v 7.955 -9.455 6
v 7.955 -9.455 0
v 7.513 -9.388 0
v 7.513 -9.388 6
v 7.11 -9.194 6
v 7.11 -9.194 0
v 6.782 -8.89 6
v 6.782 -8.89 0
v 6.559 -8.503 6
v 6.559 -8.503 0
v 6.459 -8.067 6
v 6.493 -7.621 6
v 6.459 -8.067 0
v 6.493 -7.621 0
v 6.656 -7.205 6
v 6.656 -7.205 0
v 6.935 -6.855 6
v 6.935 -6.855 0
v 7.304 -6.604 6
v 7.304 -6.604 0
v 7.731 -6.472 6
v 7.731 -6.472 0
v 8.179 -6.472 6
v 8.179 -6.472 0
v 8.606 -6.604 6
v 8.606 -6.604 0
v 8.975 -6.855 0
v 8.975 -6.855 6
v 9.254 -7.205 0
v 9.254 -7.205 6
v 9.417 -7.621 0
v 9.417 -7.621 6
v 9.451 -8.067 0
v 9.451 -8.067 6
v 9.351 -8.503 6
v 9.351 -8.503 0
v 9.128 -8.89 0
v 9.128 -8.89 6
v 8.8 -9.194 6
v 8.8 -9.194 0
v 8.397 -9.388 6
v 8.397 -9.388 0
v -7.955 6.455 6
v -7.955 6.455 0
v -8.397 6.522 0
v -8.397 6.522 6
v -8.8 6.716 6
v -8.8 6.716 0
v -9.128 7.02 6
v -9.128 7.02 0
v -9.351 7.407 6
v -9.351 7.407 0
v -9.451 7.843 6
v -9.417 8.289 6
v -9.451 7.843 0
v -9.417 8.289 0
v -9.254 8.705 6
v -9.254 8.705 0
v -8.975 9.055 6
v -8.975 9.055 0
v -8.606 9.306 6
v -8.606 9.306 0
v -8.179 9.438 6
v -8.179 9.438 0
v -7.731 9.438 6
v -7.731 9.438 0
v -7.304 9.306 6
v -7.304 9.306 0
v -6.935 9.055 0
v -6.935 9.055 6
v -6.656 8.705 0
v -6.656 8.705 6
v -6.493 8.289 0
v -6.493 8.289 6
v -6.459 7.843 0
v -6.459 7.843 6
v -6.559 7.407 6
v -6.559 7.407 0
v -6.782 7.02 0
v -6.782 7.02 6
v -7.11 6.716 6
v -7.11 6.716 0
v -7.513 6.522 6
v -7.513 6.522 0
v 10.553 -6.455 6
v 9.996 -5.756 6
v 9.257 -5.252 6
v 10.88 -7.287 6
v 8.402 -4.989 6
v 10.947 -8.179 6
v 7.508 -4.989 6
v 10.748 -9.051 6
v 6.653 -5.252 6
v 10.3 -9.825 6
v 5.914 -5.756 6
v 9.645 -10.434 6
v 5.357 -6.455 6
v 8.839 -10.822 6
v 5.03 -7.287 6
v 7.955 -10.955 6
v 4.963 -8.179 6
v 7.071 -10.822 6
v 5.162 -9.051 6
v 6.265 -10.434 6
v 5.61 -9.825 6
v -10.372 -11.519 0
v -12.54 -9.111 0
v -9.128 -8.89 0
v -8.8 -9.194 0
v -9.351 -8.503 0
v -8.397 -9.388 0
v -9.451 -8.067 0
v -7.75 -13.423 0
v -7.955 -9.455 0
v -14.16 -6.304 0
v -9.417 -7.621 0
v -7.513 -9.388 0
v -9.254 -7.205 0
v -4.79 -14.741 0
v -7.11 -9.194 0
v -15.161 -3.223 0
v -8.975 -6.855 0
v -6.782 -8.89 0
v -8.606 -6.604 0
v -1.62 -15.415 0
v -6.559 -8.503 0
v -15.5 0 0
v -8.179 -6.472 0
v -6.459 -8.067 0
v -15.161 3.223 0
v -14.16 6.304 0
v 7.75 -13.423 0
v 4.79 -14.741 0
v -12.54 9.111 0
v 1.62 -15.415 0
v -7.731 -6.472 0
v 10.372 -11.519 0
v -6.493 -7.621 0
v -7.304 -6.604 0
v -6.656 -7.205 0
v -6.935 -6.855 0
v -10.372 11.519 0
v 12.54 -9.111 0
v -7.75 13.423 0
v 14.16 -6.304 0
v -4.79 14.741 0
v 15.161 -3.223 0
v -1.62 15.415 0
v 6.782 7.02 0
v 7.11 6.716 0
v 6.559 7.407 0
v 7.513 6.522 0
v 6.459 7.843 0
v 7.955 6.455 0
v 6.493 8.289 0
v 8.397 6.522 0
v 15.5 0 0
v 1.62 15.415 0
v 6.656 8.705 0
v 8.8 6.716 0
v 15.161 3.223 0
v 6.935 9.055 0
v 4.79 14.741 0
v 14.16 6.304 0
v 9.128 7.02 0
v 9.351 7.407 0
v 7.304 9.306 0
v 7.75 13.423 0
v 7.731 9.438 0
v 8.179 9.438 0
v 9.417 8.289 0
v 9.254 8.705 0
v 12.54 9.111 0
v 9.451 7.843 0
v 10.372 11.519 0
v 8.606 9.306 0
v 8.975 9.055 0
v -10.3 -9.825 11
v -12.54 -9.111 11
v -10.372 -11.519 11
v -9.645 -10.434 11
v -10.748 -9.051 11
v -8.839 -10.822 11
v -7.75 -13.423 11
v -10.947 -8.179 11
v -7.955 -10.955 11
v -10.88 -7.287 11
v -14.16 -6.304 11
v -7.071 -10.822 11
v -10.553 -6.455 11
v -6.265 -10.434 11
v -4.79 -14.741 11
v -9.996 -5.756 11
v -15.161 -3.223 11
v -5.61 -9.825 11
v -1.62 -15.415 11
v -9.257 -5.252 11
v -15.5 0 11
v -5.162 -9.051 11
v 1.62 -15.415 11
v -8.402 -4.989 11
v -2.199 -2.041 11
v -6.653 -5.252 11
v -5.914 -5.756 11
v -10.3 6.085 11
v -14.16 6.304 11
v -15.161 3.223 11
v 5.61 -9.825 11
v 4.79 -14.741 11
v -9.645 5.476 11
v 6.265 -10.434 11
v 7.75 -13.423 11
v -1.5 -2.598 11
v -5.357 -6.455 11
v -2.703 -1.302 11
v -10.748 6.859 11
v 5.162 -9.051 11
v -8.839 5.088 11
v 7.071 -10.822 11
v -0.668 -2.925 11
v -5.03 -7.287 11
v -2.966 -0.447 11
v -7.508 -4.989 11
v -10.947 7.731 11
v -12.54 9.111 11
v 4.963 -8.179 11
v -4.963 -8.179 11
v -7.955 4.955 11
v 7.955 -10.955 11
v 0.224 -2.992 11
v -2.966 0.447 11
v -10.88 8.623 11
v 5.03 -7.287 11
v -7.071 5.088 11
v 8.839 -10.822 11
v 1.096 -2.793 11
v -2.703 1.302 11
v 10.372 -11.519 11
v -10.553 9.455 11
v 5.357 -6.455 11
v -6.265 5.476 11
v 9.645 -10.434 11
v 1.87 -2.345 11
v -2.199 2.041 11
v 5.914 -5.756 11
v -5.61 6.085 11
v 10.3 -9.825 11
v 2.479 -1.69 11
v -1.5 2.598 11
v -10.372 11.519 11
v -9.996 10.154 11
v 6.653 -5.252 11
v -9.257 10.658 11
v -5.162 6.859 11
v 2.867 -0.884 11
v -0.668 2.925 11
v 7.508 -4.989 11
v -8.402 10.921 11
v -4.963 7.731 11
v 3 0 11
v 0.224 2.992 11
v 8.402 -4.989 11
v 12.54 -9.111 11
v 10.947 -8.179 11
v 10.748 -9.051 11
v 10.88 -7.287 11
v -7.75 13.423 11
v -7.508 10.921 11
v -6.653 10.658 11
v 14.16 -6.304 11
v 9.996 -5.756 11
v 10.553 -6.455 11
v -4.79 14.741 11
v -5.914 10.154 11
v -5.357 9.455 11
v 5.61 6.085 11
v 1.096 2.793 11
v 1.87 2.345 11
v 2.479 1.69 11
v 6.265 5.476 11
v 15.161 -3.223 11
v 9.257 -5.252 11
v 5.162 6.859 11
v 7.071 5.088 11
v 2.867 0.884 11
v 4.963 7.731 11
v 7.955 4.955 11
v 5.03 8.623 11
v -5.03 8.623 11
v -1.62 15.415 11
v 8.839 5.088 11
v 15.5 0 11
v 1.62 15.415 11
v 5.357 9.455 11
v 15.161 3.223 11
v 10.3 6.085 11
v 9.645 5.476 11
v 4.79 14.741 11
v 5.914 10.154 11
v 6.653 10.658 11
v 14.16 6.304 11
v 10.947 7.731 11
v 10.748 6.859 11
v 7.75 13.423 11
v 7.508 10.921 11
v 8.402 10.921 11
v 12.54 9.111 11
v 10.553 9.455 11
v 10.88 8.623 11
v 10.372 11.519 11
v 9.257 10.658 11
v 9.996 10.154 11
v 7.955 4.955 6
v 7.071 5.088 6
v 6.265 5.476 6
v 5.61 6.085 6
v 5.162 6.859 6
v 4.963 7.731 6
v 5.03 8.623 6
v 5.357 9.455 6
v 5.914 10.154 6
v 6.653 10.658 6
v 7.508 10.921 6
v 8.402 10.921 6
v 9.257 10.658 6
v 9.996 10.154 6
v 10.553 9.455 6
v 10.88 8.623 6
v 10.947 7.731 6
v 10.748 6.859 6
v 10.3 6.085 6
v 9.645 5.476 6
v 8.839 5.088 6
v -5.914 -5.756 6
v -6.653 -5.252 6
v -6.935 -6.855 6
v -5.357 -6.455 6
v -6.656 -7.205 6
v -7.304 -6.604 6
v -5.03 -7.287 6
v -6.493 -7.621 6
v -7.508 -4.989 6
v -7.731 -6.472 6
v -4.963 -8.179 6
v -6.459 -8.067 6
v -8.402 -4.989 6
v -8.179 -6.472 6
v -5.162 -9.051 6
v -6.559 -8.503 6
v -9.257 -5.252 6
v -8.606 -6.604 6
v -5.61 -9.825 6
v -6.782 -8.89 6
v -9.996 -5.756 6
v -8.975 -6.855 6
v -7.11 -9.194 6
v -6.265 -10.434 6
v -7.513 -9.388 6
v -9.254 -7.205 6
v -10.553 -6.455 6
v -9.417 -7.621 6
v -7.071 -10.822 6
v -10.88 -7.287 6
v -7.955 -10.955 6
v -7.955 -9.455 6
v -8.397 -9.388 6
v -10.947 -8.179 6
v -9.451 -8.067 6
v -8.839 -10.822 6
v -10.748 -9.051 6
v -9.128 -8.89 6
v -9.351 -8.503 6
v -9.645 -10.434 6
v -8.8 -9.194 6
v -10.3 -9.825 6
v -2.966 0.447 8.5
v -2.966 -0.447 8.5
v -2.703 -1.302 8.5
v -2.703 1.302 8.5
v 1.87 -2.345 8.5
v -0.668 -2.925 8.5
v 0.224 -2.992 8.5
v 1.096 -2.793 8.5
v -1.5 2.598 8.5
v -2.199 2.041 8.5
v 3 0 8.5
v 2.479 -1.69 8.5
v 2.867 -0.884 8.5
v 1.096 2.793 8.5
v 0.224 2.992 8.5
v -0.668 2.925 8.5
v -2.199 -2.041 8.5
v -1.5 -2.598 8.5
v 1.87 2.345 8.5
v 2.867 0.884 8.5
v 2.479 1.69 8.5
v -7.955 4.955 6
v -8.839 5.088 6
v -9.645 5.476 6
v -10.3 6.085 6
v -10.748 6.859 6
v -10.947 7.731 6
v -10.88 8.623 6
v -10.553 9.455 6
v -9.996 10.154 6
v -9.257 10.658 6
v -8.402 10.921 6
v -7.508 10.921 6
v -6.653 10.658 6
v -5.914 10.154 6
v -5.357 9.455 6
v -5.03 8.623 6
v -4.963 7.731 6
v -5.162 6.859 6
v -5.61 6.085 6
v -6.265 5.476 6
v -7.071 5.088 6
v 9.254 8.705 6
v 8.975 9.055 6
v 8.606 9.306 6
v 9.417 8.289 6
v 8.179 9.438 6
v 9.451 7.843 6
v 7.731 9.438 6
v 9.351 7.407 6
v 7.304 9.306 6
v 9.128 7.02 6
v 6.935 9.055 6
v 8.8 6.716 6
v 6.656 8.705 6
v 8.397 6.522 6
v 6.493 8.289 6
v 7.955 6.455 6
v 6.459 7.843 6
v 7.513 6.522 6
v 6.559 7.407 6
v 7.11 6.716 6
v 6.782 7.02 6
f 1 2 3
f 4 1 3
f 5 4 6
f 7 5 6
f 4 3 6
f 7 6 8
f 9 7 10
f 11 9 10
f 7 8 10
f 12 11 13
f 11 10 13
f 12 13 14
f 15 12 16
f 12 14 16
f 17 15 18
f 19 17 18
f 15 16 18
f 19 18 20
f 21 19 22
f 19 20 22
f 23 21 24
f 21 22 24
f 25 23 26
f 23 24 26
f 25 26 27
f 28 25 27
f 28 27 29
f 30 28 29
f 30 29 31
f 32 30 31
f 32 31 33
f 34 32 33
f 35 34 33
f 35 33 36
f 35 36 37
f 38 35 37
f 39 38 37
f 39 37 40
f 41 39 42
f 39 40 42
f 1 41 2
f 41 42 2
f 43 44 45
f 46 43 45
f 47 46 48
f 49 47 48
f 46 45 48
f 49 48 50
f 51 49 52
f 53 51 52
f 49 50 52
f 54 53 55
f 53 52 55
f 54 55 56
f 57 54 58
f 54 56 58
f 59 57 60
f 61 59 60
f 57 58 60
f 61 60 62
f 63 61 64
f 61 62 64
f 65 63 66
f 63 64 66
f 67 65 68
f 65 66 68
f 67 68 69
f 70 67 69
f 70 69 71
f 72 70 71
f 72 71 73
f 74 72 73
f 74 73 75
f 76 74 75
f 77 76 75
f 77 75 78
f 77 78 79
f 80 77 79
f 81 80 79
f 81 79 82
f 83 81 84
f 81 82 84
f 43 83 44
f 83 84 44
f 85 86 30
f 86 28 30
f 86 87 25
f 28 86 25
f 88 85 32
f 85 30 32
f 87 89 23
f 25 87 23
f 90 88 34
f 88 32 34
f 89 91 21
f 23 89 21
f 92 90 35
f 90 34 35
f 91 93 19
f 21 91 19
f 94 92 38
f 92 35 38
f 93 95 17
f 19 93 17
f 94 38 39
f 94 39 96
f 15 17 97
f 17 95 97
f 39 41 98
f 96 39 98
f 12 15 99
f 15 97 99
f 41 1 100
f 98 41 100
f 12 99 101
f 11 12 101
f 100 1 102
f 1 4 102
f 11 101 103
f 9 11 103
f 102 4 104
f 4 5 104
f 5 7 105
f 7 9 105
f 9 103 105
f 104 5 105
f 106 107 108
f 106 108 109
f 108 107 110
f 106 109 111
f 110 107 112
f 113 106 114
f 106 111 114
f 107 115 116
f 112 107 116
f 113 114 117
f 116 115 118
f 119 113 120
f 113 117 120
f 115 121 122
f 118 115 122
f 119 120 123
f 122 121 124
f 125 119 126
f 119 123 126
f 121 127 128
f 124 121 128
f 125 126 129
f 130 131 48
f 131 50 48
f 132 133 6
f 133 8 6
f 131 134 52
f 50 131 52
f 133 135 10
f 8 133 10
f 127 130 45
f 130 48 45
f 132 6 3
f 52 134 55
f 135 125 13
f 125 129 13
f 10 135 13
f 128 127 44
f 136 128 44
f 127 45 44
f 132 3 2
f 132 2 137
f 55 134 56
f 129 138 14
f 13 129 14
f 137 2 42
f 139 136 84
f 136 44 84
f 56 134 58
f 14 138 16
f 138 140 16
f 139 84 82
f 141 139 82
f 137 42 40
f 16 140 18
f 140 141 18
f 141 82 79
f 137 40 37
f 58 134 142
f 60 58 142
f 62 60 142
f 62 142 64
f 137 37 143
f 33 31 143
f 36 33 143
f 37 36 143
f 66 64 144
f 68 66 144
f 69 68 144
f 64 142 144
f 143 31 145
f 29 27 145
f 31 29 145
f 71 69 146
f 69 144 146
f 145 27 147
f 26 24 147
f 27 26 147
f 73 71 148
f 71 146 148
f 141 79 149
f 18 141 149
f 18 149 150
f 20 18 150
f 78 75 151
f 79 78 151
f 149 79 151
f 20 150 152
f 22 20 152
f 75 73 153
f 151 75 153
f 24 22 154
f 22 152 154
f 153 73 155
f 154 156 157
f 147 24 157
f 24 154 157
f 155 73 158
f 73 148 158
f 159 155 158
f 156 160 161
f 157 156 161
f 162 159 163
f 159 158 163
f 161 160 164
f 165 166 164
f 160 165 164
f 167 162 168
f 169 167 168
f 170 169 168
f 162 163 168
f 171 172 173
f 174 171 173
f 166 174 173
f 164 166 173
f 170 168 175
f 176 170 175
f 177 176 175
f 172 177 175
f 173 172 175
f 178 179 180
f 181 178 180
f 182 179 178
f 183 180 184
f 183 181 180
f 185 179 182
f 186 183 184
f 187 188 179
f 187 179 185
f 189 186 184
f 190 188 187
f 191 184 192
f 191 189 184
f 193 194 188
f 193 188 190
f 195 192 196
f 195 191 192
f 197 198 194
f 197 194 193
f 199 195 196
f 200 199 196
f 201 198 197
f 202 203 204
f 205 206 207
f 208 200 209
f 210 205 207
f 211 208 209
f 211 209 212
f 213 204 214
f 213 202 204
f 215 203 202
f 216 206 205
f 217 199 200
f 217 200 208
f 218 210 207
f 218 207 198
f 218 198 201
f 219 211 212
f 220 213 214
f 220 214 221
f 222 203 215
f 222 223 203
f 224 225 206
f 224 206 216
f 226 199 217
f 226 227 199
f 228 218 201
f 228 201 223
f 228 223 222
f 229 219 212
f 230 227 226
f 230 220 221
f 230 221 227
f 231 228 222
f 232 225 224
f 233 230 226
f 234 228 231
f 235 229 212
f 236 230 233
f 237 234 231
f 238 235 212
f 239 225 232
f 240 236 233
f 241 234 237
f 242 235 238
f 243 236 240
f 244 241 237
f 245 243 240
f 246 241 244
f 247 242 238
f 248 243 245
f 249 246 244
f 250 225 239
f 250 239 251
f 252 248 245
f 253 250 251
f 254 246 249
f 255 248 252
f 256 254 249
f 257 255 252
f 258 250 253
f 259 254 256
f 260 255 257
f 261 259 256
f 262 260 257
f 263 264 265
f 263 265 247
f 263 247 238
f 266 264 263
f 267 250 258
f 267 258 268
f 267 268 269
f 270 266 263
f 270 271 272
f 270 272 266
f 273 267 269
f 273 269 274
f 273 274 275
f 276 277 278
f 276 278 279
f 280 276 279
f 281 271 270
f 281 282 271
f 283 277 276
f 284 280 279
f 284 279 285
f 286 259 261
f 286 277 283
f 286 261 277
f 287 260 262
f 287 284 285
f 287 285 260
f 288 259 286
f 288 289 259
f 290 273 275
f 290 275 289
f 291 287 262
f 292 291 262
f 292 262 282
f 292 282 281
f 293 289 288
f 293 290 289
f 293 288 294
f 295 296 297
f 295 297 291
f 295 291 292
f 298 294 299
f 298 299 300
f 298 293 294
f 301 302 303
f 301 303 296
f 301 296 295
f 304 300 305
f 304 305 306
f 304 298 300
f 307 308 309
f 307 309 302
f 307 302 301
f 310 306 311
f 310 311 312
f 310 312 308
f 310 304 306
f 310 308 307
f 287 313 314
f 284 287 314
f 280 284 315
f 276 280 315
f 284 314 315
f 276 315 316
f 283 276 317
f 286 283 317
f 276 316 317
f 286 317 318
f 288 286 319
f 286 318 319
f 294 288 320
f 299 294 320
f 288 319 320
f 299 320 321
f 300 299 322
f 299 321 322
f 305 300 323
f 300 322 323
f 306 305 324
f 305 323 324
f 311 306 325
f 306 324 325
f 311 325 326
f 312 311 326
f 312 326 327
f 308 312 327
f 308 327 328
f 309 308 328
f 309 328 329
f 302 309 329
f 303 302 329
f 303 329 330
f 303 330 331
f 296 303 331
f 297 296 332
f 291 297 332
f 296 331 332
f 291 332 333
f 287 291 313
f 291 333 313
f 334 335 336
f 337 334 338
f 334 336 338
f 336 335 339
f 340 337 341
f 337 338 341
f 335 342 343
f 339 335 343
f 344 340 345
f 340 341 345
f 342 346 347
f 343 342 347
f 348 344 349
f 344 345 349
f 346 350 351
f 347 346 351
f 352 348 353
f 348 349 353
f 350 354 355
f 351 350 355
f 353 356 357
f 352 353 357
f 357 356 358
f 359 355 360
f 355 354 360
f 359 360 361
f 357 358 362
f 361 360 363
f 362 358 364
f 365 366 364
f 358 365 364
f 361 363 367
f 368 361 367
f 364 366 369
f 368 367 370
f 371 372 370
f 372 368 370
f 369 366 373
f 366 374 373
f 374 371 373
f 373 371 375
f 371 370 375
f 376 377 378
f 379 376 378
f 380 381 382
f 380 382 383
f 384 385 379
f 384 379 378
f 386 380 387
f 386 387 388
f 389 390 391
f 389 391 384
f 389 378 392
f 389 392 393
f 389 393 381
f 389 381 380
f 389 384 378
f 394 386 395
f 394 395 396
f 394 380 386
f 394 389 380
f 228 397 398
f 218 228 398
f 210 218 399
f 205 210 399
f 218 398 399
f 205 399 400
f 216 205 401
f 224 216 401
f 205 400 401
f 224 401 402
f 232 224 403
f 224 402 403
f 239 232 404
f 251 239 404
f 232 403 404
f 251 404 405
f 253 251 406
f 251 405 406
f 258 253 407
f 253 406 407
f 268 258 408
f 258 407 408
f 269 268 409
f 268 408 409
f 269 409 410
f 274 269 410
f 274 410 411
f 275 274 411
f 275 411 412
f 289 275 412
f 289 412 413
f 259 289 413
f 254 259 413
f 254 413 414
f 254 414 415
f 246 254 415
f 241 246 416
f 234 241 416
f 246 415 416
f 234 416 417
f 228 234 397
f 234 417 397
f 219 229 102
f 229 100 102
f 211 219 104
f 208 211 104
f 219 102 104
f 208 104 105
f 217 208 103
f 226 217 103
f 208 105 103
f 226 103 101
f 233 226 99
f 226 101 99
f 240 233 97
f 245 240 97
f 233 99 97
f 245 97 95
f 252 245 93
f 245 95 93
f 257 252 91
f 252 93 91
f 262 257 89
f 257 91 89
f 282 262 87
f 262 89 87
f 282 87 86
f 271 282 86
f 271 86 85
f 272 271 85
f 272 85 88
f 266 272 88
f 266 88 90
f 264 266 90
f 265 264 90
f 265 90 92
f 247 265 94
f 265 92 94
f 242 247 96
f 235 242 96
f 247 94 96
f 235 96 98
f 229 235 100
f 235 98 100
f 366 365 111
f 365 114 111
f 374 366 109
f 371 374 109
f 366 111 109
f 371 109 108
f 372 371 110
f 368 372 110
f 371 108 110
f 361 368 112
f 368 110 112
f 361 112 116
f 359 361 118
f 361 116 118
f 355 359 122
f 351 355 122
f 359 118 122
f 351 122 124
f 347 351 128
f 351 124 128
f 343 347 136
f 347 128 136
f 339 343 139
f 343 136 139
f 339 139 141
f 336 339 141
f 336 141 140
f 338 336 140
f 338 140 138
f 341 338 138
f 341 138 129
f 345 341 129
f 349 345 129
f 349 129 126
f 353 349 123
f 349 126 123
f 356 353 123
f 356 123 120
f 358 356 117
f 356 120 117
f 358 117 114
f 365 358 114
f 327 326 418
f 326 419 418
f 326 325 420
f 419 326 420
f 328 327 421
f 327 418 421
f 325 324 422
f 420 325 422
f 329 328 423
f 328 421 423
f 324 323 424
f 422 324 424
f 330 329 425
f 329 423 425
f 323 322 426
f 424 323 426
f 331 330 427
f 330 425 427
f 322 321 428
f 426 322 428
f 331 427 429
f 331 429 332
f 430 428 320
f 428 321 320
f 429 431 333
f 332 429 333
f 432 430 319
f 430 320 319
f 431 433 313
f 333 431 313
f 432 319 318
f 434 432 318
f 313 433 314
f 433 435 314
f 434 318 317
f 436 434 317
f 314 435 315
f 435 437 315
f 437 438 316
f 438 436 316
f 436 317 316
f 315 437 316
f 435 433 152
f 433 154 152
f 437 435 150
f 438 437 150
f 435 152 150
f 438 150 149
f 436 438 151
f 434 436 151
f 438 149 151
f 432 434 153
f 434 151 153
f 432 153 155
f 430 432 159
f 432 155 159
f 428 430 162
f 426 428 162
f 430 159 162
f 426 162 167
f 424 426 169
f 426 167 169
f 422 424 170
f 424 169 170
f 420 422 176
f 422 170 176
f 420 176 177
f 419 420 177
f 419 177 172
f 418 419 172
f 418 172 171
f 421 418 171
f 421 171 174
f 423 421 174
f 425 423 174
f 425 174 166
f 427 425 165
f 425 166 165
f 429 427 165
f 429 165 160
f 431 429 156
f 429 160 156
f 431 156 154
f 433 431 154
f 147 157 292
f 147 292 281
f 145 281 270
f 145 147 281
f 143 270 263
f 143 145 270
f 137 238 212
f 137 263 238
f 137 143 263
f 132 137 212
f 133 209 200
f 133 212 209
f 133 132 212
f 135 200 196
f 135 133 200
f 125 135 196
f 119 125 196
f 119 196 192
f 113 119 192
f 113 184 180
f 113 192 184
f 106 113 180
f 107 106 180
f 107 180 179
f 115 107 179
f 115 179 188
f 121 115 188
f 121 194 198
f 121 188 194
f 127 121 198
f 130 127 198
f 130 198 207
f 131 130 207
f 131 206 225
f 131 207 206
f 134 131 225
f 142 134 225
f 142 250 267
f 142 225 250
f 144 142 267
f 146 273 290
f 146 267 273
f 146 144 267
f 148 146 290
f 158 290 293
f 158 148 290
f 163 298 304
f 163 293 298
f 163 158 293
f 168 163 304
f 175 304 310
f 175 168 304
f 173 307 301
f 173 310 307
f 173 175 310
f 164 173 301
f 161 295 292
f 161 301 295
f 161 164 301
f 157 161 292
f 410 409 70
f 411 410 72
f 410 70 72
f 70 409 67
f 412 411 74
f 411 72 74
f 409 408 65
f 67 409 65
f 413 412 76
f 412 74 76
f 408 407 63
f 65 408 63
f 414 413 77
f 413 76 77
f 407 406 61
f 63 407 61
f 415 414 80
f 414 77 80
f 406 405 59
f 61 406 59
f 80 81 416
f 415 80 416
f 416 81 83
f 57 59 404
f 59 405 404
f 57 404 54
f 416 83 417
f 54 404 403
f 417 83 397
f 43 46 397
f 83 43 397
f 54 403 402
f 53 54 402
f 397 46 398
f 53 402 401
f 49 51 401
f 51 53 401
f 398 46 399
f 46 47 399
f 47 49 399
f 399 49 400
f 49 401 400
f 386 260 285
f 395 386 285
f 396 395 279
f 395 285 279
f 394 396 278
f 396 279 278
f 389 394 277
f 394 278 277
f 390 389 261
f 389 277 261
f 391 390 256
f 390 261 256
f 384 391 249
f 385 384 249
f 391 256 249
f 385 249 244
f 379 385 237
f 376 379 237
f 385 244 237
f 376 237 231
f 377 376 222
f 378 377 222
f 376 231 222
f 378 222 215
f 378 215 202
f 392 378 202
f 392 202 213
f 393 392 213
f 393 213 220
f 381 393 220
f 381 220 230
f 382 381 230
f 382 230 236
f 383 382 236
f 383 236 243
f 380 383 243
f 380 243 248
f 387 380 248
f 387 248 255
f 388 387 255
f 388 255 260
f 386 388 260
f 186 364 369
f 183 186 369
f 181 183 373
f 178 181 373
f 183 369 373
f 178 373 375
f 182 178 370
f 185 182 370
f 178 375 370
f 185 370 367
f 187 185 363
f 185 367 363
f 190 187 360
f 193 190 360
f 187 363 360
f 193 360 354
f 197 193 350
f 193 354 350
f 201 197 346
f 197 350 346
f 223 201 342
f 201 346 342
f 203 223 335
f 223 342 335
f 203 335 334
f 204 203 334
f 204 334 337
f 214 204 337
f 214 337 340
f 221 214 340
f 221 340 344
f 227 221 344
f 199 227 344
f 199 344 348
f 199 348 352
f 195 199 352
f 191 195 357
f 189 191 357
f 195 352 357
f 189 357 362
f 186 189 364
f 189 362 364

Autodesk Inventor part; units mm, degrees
ref_plane "YZ Plane" through (0, 0, 0) normal (1, 0, 0) x (0, 1, 0)
ref_plane "XZ Plane" through (0, 0, 0) normal (0, 1, 0) x (-1, 0, 0)
ref_plane "XY Plane" through (0, 0, 0) normal (0, 0, 1) x (1, 0, 0)
sketch "Skizze1" plane through (0, 0, 0) normal (0, 0, 1) x (1, 0, 0)
  circle A0 centre (0, 0) radius 15.5
  dimension "d0" = 31
extrude "Extrusion1" add sketch "Skizze1" along normal blind 11
sketch "Skizze2" plane through (0, 0, 11) normal (0, 0, 1) x (1, 0, 0)
  line L0 (-2.5, -2.5) -> (2.5, -2.5)
  line L1 (2.5, -2.5) -> (2.5, 2.5)
  line L2 (2.5, 2.5) -> (-2.5, 2.5)
  line L3 (-2.5, 2.5) -> (-2.5, -2.5)
  line L4 (-2.5, -2.5) -> (2.5, 2.5) construction
  line L5 (2.5, -2.5) -> (-2.5, 2.5) construction
  circle A0 centre (0, 0) radius 3
  dimension "d3" = 5
  dimension "d14" = 6
extrude "Extrusion2" cut sketch "Skizze2" against normal blind 2.5 contours A0 L3 L2 L1 L0 | L0 A0 | A0 L3 | L1 A0 | A0 L2
sketch "Skizze3" plane through (0, 0, 11) normal (0, 0, 1) x (1, 0, 0)
  circle A0 centre (0, 0) radius 11.25
  line L0 (-7.955, -7.955) -> (7.955, -7.955)
  line L1 (7.955, -7.955) -> (7.955, 7.955)
  line L2 (7.955, 7.955) -> (-7.955, 7.955)
  line L3 (-7.955, 7.955) -> (-7.955, -7.955)
  line L4 (-7.955, -7.955) -> (7.955, 7.955) construction
  line L5 (7.955, -7.955) -> (-7.955, 7.955) construction
  dimension "d6" = 22.5
hole "Bohrung1" at (-7.955, -7.955, 11) at (7.955, -7.955, 11) at (7.955, 7.955, 11) at (-7.955, 7.955, 11) direction (0, 0, -1) diameter 3 end through all counterbore diameter 6 counterbore depth 5
properties part number "rotBaseMagnetMount" material "ABS-Kunststoff"
